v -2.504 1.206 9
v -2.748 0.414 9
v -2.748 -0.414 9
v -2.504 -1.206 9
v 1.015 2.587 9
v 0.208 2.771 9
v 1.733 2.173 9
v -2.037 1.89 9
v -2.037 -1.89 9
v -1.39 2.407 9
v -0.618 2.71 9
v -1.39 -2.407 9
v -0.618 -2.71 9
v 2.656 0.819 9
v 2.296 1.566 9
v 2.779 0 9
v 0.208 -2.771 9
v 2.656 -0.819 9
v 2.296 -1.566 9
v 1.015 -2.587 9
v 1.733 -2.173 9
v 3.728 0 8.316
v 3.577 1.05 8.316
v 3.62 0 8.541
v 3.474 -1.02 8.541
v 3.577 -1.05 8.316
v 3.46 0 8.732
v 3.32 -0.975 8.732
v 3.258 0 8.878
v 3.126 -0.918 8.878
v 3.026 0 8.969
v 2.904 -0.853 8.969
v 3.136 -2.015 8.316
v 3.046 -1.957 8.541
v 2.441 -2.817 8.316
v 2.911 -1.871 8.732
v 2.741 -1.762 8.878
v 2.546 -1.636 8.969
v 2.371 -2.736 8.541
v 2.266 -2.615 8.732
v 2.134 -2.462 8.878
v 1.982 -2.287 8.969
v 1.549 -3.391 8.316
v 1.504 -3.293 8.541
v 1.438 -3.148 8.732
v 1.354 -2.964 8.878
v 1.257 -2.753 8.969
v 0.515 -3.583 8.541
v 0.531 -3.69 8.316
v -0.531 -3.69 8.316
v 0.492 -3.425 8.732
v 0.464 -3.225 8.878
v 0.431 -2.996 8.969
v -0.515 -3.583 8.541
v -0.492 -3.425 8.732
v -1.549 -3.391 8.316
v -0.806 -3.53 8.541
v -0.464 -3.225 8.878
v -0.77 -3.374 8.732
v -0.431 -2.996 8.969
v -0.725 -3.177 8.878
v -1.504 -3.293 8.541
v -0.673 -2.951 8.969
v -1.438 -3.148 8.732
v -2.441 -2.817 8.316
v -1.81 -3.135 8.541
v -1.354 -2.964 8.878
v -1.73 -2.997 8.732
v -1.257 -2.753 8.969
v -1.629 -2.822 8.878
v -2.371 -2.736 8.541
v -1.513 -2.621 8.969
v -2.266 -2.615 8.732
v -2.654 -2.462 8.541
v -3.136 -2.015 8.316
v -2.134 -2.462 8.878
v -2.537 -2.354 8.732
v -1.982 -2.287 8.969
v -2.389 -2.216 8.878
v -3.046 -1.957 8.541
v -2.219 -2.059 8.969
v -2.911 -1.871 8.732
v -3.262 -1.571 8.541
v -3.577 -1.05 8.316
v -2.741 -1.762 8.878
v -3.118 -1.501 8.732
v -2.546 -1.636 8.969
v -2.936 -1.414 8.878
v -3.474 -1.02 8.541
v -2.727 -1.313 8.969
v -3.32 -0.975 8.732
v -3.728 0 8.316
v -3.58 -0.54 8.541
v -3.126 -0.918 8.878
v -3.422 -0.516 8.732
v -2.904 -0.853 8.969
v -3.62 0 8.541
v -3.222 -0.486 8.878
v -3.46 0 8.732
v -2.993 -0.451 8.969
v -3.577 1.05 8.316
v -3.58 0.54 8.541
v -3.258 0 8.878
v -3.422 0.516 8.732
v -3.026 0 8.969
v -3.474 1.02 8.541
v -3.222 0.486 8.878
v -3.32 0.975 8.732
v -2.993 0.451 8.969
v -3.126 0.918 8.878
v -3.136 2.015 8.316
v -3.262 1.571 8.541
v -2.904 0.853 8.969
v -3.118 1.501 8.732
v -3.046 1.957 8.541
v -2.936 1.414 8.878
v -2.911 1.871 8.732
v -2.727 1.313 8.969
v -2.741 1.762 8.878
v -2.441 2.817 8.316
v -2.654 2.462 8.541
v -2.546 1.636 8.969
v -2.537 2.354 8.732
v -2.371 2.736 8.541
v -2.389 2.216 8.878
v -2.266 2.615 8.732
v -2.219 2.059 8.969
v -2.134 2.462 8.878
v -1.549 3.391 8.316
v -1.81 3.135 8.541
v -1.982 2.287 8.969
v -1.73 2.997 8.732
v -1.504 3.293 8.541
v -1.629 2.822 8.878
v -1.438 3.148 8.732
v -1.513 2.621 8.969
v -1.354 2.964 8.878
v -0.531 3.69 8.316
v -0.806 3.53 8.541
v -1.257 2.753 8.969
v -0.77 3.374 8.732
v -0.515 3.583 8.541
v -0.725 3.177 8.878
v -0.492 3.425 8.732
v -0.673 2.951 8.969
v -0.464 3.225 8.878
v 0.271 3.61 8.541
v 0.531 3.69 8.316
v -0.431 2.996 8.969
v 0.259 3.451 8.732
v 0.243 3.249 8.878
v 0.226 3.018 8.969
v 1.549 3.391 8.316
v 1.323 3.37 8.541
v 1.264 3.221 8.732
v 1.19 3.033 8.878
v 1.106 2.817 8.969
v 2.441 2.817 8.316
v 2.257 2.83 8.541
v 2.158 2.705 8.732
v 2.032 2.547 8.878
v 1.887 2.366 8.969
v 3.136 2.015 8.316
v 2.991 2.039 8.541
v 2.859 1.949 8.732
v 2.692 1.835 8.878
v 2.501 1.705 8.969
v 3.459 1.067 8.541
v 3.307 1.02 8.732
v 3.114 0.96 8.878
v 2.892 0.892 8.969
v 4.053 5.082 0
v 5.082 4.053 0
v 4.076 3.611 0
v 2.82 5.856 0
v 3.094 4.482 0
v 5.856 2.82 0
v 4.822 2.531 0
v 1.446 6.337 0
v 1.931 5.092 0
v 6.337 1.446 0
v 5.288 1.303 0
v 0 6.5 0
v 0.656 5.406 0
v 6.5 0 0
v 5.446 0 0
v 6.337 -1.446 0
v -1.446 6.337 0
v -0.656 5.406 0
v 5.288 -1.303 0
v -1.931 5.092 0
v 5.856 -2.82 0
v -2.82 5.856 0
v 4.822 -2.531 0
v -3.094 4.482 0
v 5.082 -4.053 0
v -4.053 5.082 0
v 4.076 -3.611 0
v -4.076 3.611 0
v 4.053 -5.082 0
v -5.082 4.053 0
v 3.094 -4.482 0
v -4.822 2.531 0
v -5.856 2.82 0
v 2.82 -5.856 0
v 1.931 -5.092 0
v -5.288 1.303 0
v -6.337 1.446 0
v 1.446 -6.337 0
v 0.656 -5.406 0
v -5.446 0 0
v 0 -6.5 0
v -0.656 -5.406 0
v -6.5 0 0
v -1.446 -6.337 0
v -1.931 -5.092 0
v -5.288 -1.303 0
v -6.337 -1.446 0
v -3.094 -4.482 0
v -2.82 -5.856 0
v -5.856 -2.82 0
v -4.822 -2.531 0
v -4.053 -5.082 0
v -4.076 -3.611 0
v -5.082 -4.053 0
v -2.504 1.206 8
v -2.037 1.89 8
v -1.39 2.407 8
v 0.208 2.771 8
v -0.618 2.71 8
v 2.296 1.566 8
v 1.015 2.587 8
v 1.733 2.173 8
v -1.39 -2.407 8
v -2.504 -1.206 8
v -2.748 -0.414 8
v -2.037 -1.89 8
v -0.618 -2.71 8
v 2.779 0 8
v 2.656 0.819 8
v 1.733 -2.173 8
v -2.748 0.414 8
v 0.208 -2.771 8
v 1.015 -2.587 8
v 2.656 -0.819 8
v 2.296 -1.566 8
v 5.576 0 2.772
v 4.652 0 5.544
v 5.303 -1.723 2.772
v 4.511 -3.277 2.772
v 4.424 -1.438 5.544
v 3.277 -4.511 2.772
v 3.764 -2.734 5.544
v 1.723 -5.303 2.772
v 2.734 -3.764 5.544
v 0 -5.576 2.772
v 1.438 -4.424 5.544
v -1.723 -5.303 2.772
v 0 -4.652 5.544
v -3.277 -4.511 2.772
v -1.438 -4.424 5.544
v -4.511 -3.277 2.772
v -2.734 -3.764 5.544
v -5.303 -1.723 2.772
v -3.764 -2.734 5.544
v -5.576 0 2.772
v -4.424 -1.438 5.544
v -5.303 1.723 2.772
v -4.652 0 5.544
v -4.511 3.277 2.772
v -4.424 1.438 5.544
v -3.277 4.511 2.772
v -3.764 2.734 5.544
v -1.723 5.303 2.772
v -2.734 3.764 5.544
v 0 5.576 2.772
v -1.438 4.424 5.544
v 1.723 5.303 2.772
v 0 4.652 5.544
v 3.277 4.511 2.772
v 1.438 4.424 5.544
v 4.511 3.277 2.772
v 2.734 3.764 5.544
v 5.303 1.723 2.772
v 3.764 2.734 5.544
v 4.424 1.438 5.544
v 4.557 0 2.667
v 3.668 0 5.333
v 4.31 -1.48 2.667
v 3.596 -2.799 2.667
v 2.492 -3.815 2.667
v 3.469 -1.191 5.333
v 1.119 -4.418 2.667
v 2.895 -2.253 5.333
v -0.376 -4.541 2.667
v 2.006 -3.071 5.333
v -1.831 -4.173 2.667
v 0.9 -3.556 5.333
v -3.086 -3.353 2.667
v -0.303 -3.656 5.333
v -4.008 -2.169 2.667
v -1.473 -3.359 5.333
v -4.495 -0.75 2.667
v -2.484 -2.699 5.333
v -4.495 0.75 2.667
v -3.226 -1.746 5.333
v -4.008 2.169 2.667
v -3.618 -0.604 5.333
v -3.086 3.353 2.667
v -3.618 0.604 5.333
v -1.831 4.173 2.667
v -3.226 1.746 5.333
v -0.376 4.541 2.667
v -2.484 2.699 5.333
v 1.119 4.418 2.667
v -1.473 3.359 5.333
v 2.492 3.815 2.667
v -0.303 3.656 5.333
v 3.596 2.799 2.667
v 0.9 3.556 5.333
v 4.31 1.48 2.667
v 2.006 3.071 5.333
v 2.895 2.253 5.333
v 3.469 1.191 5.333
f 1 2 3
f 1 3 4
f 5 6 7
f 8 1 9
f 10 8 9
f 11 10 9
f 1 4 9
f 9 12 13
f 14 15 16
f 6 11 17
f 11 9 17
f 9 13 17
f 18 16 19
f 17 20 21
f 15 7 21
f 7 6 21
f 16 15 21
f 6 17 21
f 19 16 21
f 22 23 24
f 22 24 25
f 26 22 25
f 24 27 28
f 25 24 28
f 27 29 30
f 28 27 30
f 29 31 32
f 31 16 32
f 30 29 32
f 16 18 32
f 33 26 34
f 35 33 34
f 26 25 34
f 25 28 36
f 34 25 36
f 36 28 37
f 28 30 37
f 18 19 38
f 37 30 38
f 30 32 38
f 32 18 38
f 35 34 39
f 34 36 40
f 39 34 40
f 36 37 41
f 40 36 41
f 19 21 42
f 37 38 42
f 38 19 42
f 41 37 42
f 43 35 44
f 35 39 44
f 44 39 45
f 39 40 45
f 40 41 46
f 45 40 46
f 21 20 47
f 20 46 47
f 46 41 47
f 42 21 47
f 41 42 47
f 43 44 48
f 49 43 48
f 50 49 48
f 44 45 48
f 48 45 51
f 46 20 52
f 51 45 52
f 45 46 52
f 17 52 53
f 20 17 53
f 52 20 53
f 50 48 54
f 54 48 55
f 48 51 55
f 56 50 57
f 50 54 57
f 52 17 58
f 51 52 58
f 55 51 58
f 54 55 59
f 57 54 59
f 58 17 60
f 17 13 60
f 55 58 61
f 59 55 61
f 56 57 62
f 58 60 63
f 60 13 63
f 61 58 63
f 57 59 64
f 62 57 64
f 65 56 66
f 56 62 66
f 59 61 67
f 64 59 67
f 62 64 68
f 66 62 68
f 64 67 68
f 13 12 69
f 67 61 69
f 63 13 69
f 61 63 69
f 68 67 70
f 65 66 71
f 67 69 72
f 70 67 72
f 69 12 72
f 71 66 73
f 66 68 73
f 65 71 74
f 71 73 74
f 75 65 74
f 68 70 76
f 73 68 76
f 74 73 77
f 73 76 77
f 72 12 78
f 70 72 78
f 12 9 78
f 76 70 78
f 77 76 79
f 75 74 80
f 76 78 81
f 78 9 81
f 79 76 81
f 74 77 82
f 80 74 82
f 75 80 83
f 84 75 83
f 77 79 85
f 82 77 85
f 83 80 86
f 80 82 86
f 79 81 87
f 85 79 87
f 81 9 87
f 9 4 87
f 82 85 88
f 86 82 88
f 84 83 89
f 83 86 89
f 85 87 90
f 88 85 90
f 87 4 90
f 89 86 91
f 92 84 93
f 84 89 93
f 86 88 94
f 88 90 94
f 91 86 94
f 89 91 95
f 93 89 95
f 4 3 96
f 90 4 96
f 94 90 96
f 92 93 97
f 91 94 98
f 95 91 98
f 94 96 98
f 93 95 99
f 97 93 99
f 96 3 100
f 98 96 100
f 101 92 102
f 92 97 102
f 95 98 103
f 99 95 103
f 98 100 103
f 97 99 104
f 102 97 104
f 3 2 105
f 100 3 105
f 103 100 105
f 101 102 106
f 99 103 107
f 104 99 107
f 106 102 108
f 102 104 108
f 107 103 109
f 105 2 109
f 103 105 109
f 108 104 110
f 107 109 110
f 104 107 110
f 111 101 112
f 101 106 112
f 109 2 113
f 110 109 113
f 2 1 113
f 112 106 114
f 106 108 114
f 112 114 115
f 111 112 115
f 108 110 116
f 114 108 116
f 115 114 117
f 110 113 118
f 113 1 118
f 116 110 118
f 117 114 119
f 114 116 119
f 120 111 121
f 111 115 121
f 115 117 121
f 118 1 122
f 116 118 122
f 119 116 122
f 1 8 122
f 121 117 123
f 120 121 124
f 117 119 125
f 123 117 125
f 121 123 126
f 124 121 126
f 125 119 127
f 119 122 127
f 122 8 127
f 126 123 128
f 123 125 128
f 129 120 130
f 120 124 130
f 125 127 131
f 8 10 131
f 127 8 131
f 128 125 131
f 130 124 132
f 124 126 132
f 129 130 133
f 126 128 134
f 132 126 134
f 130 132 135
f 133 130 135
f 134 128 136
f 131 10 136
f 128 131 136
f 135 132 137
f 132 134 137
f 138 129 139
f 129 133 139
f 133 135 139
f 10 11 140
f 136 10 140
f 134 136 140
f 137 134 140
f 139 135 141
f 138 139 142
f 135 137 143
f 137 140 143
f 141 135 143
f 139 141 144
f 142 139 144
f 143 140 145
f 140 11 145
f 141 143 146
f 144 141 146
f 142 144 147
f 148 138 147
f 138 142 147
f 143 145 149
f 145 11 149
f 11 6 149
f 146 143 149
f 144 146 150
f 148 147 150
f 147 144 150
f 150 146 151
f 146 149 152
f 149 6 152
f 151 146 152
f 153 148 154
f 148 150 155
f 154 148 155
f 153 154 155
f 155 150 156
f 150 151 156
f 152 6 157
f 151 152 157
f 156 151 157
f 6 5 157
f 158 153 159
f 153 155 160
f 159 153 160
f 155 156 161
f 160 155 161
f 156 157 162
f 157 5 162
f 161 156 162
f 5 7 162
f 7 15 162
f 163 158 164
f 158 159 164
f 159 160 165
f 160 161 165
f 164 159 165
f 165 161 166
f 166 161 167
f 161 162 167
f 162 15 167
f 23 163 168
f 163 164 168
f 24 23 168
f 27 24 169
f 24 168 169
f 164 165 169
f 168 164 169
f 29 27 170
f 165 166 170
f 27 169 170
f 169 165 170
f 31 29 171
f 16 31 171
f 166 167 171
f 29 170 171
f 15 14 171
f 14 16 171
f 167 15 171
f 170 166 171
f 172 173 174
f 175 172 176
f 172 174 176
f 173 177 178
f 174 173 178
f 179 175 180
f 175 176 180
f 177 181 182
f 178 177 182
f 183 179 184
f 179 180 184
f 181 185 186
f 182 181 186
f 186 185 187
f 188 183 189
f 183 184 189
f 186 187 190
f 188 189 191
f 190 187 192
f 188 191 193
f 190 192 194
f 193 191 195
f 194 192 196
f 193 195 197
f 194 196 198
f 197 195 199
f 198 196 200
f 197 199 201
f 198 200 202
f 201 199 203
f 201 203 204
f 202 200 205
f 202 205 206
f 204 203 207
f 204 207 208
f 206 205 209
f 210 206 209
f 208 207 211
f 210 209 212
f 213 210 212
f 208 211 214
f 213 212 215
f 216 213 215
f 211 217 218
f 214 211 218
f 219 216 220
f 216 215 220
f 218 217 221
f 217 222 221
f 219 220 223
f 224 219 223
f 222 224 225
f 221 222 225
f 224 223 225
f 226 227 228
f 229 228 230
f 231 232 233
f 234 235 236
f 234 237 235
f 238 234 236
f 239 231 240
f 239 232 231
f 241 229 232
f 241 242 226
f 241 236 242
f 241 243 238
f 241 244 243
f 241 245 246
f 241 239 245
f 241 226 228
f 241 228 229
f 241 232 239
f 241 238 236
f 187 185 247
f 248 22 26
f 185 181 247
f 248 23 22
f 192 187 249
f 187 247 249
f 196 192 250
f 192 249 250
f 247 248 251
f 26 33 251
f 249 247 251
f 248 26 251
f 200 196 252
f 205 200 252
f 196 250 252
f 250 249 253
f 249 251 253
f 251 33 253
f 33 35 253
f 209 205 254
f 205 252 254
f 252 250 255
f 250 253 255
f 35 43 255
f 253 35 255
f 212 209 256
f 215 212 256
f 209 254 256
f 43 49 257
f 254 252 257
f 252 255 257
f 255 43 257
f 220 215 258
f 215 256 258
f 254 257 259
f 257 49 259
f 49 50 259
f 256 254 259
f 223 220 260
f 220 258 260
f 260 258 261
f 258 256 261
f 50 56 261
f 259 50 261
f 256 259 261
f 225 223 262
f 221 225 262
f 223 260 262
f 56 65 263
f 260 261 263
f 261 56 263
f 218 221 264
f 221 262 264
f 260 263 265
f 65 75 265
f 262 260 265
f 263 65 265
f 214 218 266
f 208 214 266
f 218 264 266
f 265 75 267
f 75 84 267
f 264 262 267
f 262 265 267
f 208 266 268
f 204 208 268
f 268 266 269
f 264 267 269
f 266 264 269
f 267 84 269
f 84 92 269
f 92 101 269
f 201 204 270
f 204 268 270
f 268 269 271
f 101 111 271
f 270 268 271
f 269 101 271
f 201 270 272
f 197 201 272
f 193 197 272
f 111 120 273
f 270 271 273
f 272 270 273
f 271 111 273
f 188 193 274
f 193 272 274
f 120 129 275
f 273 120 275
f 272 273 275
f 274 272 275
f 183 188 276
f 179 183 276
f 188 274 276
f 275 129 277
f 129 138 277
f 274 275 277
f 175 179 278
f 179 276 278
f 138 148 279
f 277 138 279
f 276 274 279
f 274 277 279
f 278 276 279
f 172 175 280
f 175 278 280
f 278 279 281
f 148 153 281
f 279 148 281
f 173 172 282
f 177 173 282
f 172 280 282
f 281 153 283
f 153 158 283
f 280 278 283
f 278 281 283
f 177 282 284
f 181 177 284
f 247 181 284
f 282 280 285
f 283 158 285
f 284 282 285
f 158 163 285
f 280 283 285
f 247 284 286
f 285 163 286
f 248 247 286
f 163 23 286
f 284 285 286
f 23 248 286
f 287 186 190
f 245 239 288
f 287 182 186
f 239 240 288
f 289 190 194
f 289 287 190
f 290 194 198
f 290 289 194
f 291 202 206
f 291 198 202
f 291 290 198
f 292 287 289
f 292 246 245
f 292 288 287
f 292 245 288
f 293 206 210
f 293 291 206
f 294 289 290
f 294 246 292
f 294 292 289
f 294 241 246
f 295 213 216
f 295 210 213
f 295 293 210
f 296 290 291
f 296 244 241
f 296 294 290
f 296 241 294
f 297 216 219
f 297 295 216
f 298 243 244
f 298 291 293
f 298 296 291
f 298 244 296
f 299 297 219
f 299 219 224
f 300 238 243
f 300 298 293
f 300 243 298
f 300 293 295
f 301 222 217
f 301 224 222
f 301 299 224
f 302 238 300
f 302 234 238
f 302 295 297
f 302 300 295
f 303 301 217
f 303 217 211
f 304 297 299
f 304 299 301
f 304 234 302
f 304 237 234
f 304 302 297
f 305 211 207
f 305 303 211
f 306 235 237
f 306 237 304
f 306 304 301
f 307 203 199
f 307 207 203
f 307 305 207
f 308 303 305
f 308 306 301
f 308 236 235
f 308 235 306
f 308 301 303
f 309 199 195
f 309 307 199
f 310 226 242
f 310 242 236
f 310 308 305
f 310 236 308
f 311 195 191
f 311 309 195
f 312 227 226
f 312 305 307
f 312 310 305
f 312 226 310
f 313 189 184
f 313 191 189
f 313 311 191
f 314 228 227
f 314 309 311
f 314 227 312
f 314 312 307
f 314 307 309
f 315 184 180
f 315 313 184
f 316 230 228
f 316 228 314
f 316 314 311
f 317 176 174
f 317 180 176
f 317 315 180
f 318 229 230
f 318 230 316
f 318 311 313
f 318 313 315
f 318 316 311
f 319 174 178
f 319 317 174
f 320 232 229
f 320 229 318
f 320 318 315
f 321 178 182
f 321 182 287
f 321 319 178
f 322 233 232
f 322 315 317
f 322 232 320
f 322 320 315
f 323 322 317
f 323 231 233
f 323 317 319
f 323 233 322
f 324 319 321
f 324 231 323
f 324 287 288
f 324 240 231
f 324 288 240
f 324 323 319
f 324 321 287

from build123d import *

# Parameters (mm, degrees)
F2_T = -1
F3_R = 1


with BuildPart() as f1:
    # F0 (on Front) → F1 (revolve)
    with BuildSketch(Plane.XZ):
        Polygon((0, 9), (0, 0), (6.5, 0), (3.5, 9), align=None)
    revolve(axis=Axis((0, 0, 4.5), (0, 0, -1)))

    # F2
    f2_openings = [f1.faces().sort_by_distance(p)[0] for p in [
        (0, 0, 0),
    ]]
    offset(amount=F2_T, openings=f2_openings)

    # F3
    f3_edges = [f1.edges().sort_by_distance(p)[0] for p in [
        (-3.5, 0, 9),
    ]]
    fillet(f3_edges, radius=F3_R)


solid = f1.part
